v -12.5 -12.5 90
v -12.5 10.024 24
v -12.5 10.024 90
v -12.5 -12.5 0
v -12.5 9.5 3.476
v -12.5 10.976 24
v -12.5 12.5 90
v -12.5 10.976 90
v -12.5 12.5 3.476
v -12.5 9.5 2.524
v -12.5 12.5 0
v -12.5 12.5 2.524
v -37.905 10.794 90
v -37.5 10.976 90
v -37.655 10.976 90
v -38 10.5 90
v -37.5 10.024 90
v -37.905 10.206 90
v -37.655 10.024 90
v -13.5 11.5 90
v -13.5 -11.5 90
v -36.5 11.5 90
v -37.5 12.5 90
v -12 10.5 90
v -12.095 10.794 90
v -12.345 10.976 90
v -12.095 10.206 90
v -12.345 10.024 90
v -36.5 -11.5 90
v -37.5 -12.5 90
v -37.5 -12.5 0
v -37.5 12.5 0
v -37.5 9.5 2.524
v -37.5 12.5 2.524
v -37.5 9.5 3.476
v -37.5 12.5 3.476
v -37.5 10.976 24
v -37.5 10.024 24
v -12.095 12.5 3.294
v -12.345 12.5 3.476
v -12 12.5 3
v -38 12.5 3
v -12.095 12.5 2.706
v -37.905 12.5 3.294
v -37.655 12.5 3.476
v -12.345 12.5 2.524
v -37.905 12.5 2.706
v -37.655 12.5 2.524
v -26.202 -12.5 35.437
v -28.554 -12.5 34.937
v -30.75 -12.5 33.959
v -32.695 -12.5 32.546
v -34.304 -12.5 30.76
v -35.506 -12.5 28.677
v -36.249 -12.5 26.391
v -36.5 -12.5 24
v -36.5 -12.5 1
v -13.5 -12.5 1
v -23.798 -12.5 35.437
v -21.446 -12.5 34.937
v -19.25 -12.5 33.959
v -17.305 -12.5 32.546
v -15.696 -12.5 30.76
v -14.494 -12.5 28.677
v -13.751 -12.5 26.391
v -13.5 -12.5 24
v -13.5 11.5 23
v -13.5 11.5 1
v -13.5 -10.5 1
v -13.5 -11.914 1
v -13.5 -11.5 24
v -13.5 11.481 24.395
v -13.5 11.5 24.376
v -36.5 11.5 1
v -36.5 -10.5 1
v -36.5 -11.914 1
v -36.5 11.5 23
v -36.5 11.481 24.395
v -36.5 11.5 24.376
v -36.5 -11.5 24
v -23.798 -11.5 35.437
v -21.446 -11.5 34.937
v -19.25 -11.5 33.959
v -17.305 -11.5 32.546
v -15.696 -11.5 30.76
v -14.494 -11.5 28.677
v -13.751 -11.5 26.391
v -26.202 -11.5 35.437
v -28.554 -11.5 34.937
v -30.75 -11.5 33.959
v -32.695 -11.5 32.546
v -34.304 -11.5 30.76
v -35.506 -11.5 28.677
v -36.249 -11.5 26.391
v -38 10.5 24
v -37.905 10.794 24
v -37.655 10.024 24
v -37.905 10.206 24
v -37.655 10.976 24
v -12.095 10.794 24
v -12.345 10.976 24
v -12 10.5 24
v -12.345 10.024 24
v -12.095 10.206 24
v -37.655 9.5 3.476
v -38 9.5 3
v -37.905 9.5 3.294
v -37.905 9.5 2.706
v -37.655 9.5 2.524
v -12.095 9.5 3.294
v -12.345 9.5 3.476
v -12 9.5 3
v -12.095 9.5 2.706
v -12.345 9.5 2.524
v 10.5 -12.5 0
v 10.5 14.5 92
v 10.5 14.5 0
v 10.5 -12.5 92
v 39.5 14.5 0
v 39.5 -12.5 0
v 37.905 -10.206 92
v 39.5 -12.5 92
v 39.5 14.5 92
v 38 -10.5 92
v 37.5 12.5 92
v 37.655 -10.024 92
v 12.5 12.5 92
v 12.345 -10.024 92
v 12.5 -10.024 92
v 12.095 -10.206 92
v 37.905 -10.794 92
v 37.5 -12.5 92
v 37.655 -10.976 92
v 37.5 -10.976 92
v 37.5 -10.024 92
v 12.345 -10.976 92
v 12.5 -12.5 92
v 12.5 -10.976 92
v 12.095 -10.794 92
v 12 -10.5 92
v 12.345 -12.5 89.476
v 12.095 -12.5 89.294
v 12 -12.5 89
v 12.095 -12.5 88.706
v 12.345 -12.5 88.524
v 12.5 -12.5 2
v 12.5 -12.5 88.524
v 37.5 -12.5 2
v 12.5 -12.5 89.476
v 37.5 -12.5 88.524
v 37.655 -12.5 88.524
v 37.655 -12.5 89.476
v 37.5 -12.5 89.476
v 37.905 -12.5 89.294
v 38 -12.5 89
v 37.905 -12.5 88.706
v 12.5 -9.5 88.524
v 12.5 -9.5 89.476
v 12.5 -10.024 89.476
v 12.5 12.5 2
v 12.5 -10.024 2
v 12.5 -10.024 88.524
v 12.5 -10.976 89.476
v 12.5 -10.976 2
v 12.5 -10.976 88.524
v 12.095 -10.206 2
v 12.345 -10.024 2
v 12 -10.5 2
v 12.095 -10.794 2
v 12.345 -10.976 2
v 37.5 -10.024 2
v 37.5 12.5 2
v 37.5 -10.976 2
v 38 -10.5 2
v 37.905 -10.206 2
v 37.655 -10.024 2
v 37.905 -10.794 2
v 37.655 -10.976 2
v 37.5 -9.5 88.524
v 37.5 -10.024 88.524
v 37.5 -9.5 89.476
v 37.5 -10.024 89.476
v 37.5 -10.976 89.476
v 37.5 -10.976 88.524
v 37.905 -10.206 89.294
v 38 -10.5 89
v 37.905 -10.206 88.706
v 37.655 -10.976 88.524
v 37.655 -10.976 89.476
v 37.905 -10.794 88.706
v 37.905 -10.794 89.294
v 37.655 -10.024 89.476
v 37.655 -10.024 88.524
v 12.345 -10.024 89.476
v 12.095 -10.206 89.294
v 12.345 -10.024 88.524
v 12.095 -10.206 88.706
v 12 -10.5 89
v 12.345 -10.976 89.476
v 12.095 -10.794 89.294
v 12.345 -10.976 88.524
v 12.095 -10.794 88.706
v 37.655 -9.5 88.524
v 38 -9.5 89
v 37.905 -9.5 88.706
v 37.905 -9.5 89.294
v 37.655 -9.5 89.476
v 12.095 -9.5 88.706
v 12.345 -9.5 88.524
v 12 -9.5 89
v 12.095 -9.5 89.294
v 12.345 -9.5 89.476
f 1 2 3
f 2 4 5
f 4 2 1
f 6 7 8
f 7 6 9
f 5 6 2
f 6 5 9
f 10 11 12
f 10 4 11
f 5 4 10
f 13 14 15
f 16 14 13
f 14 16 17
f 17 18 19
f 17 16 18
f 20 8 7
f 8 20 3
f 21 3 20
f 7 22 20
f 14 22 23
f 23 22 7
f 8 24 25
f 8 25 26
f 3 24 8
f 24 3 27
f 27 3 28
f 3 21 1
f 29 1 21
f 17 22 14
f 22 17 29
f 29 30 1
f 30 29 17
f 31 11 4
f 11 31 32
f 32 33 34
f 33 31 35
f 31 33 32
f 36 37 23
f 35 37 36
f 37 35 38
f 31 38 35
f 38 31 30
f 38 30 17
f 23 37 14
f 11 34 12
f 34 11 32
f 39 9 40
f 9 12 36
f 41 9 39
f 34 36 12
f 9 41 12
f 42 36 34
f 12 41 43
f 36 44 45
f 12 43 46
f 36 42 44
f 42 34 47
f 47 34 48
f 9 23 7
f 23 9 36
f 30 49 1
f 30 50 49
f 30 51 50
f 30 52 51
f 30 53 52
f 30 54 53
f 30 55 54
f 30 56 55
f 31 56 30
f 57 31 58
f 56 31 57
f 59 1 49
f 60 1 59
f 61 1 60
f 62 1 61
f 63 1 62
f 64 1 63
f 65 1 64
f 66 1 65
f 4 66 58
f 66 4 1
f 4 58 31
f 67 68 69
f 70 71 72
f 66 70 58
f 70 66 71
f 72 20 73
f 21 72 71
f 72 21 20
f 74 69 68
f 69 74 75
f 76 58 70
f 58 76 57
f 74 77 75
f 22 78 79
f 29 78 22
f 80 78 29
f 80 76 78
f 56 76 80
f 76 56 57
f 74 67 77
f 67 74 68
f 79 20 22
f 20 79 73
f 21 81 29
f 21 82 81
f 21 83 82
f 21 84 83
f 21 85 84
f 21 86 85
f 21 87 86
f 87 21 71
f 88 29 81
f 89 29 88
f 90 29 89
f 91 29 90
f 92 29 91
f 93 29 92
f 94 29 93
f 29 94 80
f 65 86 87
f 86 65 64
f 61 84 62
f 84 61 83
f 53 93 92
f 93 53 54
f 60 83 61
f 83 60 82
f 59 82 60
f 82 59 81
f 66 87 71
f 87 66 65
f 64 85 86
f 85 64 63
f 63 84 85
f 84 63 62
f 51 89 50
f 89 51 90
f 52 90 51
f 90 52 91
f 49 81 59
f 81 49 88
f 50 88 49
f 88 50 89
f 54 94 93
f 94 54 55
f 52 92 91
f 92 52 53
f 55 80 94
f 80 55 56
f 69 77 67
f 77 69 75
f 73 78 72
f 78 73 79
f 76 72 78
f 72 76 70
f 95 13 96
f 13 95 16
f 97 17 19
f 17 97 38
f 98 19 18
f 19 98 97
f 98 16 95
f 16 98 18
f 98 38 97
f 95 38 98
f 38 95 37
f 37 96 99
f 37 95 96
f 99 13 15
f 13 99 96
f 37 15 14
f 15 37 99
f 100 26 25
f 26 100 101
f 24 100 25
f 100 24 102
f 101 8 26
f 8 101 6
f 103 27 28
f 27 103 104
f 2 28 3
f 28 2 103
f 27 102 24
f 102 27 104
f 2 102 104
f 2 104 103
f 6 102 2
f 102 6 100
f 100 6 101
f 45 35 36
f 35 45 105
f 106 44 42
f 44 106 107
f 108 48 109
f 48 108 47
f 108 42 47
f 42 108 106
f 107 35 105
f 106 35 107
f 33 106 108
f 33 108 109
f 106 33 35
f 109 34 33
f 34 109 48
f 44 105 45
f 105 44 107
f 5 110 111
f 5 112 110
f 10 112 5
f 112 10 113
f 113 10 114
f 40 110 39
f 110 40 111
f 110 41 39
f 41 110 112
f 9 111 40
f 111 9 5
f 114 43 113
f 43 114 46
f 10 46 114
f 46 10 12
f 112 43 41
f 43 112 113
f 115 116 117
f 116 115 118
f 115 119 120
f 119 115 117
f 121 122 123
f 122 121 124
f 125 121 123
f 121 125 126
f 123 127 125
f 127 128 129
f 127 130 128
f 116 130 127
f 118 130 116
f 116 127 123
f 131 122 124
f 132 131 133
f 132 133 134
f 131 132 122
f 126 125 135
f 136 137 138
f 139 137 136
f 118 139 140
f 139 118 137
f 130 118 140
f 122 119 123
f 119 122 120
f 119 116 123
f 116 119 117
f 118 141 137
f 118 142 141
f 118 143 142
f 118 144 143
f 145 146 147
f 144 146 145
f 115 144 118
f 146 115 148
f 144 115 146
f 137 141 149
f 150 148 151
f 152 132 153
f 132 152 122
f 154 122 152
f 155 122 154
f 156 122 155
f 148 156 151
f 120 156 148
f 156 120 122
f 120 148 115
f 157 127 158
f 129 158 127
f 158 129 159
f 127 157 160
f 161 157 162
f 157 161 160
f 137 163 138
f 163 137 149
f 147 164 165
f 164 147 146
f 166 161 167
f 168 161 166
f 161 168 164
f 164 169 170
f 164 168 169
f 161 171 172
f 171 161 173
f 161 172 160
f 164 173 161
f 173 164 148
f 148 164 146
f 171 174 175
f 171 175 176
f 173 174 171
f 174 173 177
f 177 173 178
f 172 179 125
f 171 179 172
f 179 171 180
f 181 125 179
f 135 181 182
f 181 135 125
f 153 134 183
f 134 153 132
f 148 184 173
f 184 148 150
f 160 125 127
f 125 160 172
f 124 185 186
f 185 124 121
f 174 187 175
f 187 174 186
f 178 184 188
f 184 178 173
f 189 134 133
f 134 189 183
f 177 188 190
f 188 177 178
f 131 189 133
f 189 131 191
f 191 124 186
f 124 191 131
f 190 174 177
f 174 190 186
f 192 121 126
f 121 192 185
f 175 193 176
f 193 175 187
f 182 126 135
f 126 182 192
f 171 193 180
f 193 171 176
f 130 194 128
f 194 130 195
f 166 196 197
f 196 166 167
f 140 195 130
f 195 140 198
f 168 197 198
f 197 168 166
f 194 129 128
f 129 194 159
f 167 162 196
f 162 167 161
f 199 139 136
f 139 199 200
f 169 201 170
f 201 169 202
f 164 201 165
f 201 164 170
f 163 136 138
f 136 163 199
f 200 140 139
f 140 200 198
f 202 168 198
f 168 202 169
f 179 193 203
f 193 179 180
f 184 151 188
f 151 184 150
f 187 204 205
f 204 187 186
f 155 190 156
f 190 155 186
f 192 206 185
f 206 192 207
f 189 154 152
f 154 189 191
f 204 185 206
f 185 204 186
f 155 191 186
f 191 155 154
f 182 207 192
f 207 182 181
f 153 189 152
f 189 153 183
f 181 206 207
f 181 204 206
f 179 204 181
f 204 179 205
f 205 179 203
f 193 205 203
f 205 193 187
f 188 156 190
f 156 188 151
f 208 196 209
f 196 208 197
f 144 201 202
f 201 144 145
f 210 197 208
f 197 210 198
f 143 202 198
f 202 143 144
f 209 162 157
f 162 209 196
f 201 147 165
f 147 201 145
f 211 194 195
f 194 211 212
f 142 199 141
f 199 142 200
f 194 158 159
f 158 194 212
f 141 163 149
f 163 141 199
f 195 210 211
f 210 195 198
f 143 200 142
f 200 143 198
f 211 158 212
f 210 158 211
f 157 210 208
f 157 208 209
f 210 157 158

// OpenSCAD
width=25;
depth=25;
height=90;
wall_depth=1;

translate([-width*1.5,-depth/2,0]){
 union(){
  difference(){
   //Build the general tube
   difference() {
    cube([width,depth,height]);
    translate([wall_depth, wall_depth,wall_depth]){
     cube([width-2*wall_depth, depth-2*wall_depth, height]);
    }
   }

   //The opening at the bottom:
   translate([width/2,-1,width-1]){
    rotate([-90,0,0]){
     union() {
      cylinder(h=wall_depth+2, r=width/2-wall_depth);
      translate([-1*(width/2-wall_depth),0,0]){
       cube([width-wall_depth*2, width-wall_depth*2, wall_depth+2]);
      }
     }
    }
   }
  }

  //Output Ramp:
  translate([0,1,0]){
   rotate([45,0,0]){
    color("blue") cube([width, floor(sqrt((depth*depth)*2))-1.5, 1]);
   }
  }

 //Cover rails
  translate([0,width-wall_depth*2,depth-wall_depth]){
   cylinder(h=height-depth+wall_depth, r=wall_depth/2,$fn=10);
  }
  translate([width,width-wall_depth*2,depth-wall_depth]){
   cylinder(h=height-depth+wall_depth, r=wall_depth/2,$fn=10);
  }  

  translate([0,width,wall_depth*3]){
   rotate([90,0,0]){
    cylinder(h=wall_depth*3, r=wall_depth/2, $fn=10);
   }
  }
  translate([width,width,wall_depth*3]){
   rotate([90,0,0]){
    cylinder(h=wall_depth*3, r=wall_depth/2, $fn=10);
   }
  }
 }
}
//cover
translate([width*1.5,-1*wall_depth-depth/2,height+wall_depth*2]){
 color("red")
 rotate([0,180,0])
 difference(){
  translate([-2*wall_depth,wall_depth,0]){
   cube([width+wall_depth*4,depth+wall_depth*2,height+wall_depth*2]);
  }
  translate([0,0,-1]){
   cube([width,depth+wall_depth,height+1]);
  }
 
  //cover Slides
  translate([0,wall_depth*3,0]){
   cylinder(h=height, r=wall_depth/2,$fn=10);
  }
  translate([width,wall_depth*3,0]){
   cylinder(h=height, r=wall_depth/2,$fn=10);
  }

  translate([0,wall_depth*4,wall_depth*3]){
   rotate([90,0,0]){
    cylinder(h=wall_depth*4, r=wall_depth/2, $fn=10);
   }
  }
  translate([width,wall_depth*4,wall_depth*3]){
   rotate([90,0,0]){
    cylinder(h=wall_depth*4, r=wall_depth/2, $fn=10);
   }
  }
 }
}
